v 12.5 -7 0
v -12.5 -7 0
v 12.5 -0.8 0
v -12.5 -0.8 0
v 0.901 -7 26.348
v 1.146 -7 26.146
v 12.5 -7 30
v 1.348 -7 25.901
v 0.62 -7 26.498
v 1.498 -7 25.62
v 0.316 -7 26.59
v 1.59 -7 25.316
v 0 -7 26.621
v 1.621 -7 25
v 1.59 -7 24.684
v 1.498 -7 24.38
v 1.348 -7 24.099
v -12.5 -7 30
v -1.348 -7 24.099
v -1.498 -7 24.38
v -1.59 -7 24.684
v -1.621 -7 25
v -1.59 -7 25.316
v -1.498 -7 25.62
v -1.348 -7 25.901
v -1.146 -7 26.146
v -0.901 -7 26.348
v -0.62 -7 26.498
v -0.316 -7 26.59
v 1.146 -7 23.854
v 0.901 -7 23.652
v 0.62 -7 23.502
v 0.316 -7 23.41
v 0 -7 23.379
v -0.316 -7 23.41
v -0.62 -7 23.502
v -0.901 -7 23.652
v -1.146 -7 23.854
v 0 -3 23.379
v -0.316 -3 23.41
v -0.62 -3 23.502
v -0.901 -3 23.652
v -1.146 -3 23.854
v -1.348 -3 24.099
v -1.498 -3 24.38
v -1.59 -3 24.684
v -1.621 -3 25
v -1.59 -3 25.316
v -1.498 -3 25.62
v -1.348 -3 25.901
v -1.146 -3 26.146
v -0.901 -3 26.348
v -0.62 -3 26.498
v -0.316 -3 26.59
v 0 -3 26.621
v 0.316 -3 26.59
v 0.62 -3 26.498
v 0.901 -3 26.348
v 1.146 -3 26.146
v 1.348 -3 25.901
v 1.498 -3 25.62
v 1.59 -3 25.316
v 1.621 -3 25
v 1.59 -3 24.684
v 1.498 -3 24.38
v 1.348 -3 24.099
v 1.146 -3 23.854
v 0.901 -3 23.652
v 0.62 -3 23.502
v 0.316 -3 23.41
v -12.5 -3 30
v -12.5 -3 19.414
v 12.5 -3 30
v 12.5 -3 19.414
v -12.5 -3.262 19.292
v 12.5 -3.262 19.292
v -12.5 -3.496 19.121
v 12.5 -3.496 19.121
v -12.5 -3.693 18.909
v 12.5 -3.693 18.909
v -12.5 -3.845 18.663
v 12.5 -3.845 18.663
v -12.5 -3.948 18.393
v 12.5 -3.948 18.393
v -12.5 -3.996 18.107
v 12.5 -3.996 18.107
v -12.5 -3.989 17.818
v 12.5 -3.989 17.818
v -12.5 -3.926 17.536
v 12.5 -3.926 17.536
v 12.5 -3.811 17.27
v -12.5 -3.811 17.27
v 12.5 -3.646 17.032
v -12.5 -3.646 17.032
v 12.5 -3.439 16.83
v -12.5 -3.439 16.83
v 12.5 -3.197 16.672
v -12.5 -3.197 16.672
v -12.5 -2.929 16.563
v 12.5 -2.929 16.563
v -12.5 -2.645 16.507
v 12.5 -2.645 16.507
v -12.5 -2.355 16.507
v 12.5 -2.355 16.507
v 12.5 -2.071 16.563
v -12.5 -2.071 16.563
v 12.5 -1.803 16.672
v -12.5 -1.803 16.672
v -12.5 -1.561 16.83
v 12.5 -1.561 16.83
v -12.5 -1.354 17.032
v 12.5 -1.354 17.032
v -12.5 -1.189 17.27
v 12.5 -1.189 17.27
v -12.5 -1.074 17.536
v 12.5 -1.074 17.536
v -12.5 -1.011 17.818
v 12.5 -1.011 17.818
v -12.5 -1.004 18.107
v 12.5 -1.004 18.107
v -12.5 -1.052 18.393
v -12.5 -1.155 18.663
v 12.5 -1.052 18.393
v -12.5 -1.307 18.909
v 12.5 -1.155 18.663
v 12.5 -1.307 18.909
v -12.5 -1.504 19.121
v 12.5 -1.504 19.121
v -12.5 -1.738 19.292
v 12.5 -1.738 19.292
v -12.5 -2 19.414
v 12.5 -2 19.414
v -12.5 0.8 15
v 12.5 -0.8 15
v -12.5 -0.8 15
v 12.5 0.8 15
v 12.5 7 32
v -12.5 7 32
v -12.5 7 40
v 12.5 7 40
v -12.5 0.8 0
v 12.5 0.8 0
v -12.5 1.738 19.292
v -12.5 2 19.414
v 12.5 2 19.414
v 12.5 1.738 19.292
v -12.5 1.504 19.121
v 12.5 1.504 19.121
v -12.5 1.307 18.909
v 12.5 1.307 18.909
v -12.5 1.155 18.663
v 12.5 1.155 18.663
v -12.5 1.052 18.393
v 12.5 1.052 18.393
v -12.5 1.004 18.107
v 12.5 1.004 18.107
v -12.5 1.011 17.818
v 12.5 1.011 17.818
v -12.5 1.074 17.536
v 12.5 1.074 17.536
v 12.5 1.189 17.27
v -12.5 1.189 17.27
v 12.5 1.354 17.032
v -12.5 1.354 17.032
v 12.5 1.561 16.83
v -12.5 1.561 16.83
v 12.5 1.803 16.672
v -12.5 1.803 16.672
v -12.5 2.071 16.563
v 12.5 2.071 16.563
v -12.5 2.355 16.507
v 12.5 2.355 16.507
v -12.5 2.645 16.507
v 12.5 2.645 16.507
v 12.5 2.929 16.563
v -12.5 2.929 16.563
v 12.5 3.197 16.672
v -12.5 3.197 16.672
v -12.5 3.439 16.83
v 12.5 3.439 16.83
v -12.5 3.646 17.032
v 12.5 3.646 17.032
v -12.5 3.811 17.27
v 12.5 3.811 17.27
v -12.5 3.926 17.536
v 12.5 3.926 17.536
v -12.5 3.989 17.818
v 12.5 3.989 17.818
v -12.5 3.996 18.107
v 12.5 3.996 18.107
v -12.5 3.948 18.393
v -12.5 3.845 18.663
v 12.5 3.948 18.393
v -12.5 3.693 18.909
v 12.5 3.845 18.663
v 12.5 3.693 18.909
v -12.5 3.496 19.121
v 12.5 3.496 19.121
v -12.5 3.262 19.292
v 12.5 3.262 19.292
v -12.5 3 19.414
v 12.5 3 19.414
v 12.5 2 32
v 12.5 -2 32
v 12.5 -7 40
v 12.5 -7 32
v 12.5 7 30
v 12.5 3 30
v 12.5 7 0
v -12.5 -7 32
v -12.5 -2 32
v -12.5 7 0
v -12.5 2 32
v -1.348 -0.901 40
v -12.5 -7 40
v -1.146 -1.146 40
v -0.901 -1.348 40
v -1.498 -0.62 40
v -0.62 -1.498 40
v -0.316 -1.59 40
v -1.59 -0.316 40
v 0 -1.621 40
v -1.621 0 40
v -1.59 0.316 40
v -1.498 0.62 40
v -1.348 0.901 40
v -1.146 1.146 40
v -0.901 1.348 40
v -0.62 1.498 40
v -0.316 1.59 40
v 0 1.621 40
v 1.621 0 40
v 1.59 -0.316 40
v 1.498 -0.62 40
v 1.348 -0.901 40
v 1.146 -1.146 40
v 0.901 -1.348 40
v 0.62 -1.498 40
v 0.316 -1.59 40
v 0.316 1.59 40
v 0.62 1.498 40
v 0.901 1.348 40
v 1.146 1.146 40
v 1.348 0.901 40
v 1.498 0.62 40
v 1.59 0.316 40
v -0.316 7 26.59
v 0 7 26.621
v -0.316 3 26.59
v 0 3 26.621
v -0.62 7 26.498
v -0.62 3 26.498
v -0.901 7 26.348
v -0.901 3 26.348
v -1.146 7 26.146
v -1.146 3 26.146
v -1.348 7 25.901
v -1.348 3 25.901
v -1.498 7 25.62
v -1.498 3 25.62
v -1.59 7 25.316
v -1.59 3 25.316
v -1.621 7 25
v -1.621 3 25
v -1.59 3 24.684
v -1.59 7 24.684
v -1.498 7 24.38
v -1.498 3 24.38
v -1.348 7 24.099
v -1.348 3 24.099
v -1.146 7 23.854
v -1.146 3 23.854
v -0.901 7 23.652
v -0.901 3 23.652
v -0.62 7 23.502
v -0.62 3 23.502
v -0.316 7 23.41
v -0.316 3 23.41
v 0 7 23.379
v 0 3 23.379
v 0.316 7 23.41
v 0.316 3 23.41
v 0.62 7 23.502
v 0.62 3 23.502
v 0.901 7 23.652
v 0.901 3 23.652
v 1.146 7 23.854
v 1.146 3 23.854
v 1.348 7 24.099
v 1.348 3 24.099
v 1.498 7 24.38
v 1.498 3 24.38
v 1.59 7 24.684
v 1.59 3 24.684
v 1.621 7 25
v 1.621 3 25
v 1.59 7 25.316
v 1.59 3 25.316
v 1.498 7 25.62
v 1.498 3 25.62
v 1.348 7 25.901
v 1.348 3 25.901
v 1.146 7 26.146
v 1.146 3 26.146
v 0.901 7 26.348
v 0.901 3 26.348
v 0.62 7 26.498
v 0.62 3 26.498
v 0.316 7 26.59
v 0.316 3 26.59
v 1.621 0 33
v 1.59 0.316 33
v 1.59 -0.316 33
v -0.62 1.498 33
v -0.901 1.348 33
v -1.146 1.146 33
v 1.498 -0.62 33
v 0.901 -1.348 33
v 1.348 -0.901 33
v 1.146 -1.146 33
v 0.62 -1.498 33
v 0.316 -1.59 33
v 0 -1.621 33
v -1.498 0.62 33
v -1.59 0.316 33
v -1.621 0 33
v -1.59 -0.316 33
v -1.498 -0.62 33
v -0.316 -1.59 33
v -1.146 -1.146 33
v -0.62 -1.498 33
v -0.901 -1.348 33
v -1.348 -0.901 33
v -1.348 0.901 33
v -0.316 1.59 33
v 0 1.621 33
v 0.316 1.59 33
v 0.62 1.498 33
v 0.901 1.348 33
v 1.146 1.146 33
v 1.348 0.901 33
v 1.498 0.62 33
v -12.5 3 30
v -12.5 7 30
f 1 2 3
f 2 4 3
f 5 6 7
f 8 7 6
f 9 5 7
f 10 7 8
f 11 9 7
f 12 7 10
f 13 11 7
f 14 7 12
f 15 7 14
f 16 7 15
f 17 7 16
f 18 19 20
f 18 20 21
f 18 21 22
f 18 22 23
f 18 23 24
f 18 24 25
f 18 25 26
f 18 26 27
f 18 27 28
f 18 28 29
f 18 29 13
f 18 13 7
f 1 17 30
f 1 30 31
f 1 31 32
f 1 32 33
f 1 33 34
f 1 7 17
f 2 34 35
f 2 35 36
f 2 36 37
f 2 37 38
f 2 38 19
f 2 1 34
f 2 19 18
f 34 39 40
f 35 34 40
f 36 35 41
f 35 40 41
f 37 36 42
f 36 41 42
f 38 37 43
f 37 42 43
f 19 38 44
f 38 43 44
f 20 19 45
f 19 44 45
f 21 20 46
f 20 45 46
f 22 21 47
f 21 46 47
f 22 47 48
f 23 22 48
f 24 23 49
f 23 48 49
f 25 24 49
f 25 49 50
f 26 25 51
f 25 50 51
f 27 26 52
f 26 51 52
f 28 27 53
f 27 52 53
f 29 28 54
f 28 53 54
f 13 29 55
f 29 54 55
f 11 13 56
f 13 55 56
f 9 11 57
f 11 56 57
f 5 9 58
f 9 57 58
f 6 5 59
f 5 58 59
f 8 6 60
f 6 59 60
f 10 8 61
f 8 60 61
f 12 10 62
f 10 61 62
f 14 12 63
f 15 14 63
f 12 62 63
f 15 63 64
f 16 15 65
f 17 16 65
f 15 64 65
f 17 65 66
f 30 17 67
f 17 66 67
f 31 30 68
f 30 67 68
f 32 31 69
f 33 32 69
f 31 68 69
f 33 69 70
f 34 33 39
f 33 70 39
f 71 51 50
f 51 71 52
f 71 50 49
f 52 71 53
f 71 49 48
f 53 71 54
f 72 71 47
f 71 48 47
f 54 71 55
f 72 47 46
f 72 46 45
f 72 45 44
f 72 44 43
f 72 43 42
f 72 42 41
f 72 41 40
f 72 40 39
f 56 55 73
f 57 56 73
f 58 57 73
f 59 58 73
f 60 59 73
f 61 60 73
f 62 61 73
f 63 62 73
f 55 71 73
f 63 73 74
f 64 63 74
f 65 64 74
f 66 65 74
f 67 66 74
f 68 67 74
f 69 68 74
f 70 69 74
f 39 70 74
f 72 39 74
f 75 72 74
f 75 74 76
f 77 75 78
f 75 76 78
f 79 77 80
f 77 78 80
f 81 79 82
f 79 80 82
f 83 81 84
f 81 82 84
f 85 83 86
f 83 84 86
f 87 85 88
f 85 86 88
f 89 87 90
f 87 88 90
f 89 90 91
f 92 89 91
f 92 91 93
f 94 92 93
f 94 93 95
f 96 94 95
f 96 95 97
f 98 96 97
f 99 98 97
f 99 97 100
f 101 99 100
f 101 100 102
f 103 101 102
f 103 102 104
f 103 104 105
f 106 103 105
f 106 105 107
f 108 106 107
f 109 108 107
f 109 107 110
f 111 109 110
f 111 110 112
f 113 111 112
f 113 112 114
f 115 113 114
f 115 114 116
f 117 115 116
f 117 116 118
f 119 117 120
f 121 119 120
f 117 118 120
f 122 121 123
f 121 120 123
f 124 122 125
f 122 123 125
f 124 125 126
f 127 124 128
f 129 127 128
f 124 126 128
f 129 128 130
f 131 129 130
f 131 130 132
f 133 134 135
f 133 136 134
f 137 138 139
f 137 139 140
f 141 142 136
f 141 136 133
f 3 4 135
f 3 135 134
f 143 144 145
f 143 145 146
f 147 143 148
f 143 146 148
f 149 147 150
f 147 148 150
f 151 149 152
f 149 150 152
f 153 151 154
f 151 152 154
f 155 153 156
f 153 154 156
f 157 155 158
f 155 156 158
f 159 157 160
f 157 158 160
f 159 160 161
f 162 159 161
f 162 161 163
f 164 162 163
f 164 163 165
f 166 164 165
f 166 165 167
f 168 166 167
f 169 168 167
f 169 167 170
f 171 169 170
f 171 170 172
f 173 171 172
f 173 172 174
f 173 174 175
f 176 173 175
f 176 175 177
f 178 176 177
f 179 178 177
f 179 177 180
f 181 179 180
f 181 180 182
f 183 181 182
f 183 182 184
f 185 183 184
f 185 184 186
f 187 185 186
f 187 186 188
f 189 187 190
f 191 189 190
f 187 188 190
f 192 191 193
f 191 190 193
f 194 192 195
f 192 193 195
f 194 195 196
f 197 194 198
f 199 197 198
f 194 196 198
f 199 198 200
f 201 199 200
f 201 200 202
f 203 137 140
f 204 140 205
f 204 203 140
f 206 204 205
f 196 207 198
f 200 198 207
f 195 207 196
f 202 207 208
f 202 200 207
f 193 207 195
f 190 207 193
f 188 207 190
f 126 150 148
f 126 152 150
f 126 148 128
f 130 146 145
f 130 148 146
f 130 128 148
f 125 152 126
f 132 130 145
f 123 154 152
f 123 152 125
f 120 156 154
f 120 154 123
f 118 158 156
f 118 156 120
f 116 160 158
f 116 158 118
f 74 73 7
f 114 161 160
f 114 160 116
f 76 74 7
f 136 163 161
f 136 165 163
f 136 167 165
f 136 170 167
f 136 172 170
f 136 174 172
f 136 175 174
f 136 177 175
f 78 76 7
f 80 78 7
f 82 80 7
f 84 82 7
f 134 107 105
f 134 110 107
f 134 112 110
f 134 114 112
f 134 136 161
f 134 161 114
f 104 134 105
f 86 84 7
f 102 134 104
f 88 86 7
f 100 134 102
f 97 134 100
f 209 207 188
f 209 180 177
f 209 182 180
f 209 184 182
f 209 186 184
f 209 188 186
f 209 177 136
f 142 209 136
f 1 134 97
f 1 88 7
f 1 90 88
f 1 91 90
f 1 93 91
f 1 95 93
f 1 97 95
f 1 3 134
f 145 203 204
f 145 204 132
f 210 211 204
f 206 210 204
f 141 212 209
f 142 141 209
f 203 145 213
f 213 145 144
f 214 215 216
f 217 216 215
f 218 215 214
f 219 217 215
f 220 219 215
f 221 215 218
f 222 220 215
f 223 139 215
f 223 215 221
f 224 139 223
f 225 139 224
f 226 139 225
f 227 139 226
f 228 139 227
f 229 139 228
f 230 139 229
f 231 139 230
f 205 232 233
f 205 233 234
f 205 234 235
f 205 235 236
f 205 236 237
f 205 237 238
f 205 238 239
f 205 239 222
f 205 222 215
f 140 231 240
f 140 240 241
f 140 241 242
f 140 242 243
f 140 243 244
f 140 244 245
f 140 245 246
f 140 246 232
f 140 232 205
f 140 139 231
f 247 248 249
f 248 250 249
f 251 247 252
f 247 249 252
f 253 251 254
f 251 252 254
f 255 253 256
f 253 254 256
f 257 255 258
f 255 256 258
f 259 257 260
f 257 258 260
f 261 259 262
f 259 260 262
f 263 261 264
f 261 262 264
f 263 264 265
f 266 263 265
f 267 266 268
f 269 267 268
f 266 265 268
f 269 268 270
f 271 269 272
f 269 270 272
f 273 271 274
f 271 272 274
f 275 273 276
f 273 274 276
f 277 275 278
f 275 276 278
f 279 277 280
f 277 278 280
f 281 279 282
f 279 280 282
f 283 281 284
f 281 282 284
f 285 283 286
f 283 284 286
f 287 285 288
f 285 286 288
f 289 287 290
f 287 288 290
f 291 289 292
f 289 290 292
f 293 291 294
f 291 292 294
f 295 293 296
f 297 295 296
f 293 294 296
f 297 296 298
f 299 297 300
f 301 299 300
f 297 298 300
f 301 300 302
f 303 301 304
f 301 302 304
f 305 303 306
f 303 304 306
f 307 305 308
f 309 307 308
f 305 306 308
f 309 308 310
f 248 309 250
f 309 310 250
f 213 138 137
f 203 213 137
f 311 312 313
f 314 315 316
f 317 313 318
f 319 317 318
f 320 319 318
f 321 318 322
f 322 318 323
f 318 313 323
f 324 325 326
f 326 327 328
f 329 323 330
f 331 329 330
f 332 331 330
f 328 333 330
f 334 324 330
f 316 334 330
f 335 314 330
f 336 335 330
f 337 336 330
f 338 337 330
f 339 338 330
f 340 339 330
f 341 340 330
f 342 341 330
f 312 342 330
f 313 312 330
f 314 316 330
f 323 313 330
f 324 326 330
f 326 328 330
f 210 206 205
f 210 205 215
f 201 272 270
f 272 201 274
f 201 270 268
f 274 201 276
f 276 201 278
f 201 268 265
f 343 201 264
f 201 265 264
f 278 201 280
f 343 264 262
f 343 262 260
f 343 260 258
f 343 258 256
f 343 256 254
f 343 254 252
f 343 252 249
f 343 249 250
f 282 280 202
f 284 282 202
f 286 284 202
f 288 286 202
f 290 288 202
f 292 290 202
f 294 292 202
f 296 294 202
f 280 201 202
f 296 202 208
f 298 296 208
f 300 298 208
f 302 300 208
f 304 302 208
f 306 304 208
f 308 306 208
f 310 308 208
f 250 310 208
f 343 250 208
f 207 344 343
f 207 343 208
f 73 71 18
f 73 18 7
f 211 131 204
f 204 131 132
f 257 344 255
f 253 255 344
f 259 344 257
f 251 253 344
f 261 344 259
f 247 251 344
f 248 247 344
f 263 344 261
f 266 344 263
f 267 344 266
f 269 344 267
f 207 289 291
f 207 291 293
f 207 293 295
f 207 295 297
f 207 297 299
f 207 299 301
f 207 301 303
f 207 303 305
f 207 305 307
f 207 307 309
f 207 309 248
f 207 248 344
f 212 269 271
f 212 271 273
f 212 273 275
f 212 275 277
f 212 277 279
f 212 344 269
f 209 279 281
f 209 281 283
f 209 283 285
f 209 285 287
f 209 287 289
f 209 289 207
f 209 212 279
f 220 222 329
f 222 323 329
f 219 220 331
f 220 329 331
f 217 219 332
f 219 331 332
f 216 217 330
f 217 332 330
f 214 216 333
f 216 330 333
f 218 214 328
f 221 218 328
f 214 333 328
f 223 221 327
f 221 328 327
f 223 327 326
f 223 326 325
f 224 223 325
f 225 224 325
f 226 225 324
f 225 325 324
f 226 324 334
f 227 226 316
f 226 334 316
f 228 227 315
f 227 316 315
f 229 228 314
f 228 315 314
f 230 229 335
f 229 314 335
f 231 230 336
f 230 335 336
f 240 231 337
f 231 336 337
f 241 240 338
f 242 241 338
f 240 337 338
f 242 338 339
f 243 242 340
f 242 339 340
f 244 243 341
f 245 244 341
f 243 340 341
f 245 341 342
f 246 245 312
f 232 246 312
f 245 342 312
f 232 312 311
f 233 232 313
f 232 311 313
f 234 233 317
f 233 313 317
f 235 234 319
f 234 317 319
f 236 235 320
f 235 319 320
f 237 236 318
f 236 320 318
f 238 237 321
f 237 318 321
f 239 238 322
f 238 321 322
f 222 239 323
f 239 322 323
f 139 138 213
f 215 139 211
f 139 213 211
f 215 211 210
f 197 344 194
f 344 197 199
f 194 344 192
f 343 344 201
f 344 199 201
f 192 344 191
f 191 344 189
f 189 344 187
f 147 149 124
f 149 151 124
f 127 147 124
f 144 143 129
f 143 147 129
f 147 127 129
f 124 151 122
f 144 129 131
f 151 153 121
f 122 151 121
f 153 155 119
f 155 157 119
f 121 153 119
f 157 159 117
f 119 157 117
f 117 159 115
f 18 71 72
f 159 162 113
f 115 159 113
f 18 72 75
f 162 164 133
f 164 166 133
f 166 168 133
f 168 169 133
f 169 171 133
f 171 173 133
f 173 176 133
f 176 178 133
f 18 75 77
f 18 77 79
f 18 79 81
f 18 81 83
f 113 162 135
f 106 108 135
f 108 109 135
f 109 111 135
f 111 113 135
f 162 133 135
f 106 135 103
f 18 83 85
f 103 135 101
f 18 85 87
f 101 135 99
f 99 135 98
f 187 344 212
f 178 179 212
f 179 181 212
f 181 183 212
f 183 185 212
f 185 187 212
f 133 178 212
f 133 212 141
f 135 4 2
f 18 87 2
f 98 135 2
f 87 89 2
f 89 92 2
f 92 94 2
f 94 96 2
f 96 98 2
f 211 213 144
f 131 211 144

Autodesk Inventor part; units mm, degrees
ref_plane "YZ Plane" through (0, 0, 0) normal (1, 0, 0) x (0, 1, 0)
ref_plane "XZ Plane" through (0, 0, 0) normal (0, 1, 0) x (-1, 0, 0)
ref_plane "XY Plane" through (0, 0, 0) normal (0, 0, 1) x (1, 0, 0)
sketch "Sketch1" plane through (0, 0, 0) normal (0, 0, 1) x (1, 0, 0)
  line L0 (12.5, -7) -> (-12.5, -7)
  line L1 (-12.5, -7) -> (-12.5, 7)
  line L2 (-12.5, 7) -> (12.5, 7)
  line L3 (12.5, 7) -> (12.5, -7)
  line L4 (12.5, -7) -> (-12.5, 7) construction
  line L5 (-12.5, -7) -> (12.5, 7) construction
  point P0 (0, 0)
  dimension "d0" = 25
  dimension "d1" = 14
extrude "Extrusion1" add sketch "Sketch1" along normal blind 30
sketch "Sketch2" plane through (0, 0, 0) normal (0, 0, -1) x (-1, 0, 0)
  line L0 (15, -0.8) -> (-15, -0.8)
  line L1 (-15, -0.8) -> (-15, 0.8)
  line L2 (-15, 0.8) -> (15, 0.8)
  line L3 (15, 0.8) -> (15, -0.8)
  line L4 (15, -0.8) -> (-15, 0.8) construction
  line L5 (-15, -0.8) -> (15, 0.8) construction
  point P0 (0, 0)
  dimension "d4" = 30
  dimension "d5" = 1.6
extrude "Extrusion2" cut sketch "Sketch2" against normal blind 15
sketch "Sketch4" plane through (12.5, -7, 30) normal (1, 0, 0) x (0, 0, -1)
  line L0 (-12, 4.5) -> (12, 4.5)
  line L1 (12, 4.5) -> (12, 9.5)
  line L2 (12, 9.5) -> (-12, 9.5)
  line L3 (-12, 9.5) -> (-12, 4.5)
  line L4 (0, 0) -> (0, 14) projected
  line L5 (-12, 4.5) -> (12, 9.5) construction
  line L6 (12, 4.5) -> (-12, 9.5) construction
  line L7 (30, 0) -> (0, 0) projected
  circle A0 centre (12, 9.5) radius 1.5
  circle A1 centre (12, 4.5) radius 1.5
  line L8 (-12, 9) -> (12, 9)
  line L9 (12, 9) -> (12, 10)
  line L10 (12, 10) -> (-12, 10)
  line L11 (-12, 10) -> (-12, 9)
  line L12 (0, 14) -> (0, 0) projected
  line L13 (-12, 9) -> (12, 10) construction
  line L14 (12, 9) -> (-12, 10) construction
  line L15 (-12, 4) -> (12, 4)
  line L16 (12, 4) -> (12, 5)
  line L17 (12, 5) -> (-12, 5)
  line L18 (-12, 5) -> (-12, 4)
  line L19 (-12, 4) -> (12, 5) construction
  line L20 (12, 4) -> (-12, 5) construction
  point P0 (30, 7)
  point P1 (0, 7)
  point P2 (0, 9.5)
  point P3 (0, 4.5)
  point P4 (10.5858, 5)
  point P5 (10.5858, 4)
  point P6 (10.5858, 10)
  point P7 (-12, 9)
  point P8 (10.5858, 9)
  dimension "d16" = 5
  dimension "d17" = 3
  dimension "d18" = 3
  dimension "d19" = 1
  dimension "d20" = 1
  dimension "d23" = 12
extrude "Extrusion3" cut sketch "Sketch4" against normal through all contours L3 L17 L4 L0 | L0 L4 L15 L18 | L4 L17 A1 L0 | L0 A1 L15 L4 | A1 L17 L1 L0 | L0 L16 L15 A1 | L3 L2 L4 L8 | L1 A1 L15 L16 | A1 L1 L17 | L4 L2 A0 L8 | L11 L10 L4 L2 | L4 L10 A0 L2 | L8 L1 A0 | A0 L2 L1 L8 | L1 L9 L10 A0 | A0 L10 L9 L2
sketch "Sketch5" plane through (-12.5, 7, 0) normal (0, 1, 0) x (1, 0, 0)
  line L0 (25, -30) -> (0, -30) projected
  point P0 (12.5, 0)
  point P1 (12.5, -25)
  point P2 (12.5, -30)
  dimension "d24" = 5
sketch "Sketch6" plane through (-12.5, -7, 0) normal (0, -1, 0) x (1, 0, 0)
  point P0 (12.5, 0)
  point P1 (12.5, 25)
hole "Hole2" at (0, -7, 25) direction (0, 1, 0) diameter 3.242 depth 4 thread size "M4x0.7" class "6H" standard "ISO Metric profile"
hole "Hole3" at (0, 7, 25) direction (0, -1, 0) diameter 3.242 depth 4 thread size "M4x0.7" class "6H" standard "ISO Metric profile"
sketch "Sketch7" plane through (0, 0, 30) normal (0, 0, 1) x (1, 0, 0)
  line L0 (-12.5, -2) -> (12.5, -2) projected
  line L1 (12.5, -2) -> (12.5, 2) projected
  line L2 (12.5, 2) -> (-12.5, 2) projected
  line L3 (-12.5, 2) -> (-12.5, -2) projected
  point P0 (0, 0)
extrude "Extrusion4" add sketch "Sketch7" along normal blind 2
sketch "Sketch11" plane through (0, 0, 32) normal (0, 0, 1) x (1, 0, 0)
  line L0 (-12.5, 7) -> (-12.5, 0.8) projected
  line L1 (12.5, -7) -> (-12.5, -7)
  line L2 (-12.5, -7) -> (-12.5, 7)
  line L3 (-12.5, 7) -> (12.5, 7)
  line L4 (12.5, 7) -> (12.5, -7)
  line L5 (12.5, -7) -> (-12.5, 7) construction
  line L6 (-12.5, -7) -> (12.5, 7) construction
  point P0 (0, 0)
  point P1 (-12.5, 0.8)
extrude "Extrusion6" add sketch "Sketch11" along normal blind 8
sketch "Sketch12" plane through (0, 0, 40) normal (0, 0, 1) x (1, 0, 0)
  point P0 (0, 0)
  point P1 (0, 0)
hole "Hole4" at (0, 0, 40) direction (0, 0, -1) diameter 3.242 depth 7 thread size "M4x0.7" class "6H" standard "ISO Metric profile"
properties part number "holder_slide_1.5mmThick_25mmWide"
